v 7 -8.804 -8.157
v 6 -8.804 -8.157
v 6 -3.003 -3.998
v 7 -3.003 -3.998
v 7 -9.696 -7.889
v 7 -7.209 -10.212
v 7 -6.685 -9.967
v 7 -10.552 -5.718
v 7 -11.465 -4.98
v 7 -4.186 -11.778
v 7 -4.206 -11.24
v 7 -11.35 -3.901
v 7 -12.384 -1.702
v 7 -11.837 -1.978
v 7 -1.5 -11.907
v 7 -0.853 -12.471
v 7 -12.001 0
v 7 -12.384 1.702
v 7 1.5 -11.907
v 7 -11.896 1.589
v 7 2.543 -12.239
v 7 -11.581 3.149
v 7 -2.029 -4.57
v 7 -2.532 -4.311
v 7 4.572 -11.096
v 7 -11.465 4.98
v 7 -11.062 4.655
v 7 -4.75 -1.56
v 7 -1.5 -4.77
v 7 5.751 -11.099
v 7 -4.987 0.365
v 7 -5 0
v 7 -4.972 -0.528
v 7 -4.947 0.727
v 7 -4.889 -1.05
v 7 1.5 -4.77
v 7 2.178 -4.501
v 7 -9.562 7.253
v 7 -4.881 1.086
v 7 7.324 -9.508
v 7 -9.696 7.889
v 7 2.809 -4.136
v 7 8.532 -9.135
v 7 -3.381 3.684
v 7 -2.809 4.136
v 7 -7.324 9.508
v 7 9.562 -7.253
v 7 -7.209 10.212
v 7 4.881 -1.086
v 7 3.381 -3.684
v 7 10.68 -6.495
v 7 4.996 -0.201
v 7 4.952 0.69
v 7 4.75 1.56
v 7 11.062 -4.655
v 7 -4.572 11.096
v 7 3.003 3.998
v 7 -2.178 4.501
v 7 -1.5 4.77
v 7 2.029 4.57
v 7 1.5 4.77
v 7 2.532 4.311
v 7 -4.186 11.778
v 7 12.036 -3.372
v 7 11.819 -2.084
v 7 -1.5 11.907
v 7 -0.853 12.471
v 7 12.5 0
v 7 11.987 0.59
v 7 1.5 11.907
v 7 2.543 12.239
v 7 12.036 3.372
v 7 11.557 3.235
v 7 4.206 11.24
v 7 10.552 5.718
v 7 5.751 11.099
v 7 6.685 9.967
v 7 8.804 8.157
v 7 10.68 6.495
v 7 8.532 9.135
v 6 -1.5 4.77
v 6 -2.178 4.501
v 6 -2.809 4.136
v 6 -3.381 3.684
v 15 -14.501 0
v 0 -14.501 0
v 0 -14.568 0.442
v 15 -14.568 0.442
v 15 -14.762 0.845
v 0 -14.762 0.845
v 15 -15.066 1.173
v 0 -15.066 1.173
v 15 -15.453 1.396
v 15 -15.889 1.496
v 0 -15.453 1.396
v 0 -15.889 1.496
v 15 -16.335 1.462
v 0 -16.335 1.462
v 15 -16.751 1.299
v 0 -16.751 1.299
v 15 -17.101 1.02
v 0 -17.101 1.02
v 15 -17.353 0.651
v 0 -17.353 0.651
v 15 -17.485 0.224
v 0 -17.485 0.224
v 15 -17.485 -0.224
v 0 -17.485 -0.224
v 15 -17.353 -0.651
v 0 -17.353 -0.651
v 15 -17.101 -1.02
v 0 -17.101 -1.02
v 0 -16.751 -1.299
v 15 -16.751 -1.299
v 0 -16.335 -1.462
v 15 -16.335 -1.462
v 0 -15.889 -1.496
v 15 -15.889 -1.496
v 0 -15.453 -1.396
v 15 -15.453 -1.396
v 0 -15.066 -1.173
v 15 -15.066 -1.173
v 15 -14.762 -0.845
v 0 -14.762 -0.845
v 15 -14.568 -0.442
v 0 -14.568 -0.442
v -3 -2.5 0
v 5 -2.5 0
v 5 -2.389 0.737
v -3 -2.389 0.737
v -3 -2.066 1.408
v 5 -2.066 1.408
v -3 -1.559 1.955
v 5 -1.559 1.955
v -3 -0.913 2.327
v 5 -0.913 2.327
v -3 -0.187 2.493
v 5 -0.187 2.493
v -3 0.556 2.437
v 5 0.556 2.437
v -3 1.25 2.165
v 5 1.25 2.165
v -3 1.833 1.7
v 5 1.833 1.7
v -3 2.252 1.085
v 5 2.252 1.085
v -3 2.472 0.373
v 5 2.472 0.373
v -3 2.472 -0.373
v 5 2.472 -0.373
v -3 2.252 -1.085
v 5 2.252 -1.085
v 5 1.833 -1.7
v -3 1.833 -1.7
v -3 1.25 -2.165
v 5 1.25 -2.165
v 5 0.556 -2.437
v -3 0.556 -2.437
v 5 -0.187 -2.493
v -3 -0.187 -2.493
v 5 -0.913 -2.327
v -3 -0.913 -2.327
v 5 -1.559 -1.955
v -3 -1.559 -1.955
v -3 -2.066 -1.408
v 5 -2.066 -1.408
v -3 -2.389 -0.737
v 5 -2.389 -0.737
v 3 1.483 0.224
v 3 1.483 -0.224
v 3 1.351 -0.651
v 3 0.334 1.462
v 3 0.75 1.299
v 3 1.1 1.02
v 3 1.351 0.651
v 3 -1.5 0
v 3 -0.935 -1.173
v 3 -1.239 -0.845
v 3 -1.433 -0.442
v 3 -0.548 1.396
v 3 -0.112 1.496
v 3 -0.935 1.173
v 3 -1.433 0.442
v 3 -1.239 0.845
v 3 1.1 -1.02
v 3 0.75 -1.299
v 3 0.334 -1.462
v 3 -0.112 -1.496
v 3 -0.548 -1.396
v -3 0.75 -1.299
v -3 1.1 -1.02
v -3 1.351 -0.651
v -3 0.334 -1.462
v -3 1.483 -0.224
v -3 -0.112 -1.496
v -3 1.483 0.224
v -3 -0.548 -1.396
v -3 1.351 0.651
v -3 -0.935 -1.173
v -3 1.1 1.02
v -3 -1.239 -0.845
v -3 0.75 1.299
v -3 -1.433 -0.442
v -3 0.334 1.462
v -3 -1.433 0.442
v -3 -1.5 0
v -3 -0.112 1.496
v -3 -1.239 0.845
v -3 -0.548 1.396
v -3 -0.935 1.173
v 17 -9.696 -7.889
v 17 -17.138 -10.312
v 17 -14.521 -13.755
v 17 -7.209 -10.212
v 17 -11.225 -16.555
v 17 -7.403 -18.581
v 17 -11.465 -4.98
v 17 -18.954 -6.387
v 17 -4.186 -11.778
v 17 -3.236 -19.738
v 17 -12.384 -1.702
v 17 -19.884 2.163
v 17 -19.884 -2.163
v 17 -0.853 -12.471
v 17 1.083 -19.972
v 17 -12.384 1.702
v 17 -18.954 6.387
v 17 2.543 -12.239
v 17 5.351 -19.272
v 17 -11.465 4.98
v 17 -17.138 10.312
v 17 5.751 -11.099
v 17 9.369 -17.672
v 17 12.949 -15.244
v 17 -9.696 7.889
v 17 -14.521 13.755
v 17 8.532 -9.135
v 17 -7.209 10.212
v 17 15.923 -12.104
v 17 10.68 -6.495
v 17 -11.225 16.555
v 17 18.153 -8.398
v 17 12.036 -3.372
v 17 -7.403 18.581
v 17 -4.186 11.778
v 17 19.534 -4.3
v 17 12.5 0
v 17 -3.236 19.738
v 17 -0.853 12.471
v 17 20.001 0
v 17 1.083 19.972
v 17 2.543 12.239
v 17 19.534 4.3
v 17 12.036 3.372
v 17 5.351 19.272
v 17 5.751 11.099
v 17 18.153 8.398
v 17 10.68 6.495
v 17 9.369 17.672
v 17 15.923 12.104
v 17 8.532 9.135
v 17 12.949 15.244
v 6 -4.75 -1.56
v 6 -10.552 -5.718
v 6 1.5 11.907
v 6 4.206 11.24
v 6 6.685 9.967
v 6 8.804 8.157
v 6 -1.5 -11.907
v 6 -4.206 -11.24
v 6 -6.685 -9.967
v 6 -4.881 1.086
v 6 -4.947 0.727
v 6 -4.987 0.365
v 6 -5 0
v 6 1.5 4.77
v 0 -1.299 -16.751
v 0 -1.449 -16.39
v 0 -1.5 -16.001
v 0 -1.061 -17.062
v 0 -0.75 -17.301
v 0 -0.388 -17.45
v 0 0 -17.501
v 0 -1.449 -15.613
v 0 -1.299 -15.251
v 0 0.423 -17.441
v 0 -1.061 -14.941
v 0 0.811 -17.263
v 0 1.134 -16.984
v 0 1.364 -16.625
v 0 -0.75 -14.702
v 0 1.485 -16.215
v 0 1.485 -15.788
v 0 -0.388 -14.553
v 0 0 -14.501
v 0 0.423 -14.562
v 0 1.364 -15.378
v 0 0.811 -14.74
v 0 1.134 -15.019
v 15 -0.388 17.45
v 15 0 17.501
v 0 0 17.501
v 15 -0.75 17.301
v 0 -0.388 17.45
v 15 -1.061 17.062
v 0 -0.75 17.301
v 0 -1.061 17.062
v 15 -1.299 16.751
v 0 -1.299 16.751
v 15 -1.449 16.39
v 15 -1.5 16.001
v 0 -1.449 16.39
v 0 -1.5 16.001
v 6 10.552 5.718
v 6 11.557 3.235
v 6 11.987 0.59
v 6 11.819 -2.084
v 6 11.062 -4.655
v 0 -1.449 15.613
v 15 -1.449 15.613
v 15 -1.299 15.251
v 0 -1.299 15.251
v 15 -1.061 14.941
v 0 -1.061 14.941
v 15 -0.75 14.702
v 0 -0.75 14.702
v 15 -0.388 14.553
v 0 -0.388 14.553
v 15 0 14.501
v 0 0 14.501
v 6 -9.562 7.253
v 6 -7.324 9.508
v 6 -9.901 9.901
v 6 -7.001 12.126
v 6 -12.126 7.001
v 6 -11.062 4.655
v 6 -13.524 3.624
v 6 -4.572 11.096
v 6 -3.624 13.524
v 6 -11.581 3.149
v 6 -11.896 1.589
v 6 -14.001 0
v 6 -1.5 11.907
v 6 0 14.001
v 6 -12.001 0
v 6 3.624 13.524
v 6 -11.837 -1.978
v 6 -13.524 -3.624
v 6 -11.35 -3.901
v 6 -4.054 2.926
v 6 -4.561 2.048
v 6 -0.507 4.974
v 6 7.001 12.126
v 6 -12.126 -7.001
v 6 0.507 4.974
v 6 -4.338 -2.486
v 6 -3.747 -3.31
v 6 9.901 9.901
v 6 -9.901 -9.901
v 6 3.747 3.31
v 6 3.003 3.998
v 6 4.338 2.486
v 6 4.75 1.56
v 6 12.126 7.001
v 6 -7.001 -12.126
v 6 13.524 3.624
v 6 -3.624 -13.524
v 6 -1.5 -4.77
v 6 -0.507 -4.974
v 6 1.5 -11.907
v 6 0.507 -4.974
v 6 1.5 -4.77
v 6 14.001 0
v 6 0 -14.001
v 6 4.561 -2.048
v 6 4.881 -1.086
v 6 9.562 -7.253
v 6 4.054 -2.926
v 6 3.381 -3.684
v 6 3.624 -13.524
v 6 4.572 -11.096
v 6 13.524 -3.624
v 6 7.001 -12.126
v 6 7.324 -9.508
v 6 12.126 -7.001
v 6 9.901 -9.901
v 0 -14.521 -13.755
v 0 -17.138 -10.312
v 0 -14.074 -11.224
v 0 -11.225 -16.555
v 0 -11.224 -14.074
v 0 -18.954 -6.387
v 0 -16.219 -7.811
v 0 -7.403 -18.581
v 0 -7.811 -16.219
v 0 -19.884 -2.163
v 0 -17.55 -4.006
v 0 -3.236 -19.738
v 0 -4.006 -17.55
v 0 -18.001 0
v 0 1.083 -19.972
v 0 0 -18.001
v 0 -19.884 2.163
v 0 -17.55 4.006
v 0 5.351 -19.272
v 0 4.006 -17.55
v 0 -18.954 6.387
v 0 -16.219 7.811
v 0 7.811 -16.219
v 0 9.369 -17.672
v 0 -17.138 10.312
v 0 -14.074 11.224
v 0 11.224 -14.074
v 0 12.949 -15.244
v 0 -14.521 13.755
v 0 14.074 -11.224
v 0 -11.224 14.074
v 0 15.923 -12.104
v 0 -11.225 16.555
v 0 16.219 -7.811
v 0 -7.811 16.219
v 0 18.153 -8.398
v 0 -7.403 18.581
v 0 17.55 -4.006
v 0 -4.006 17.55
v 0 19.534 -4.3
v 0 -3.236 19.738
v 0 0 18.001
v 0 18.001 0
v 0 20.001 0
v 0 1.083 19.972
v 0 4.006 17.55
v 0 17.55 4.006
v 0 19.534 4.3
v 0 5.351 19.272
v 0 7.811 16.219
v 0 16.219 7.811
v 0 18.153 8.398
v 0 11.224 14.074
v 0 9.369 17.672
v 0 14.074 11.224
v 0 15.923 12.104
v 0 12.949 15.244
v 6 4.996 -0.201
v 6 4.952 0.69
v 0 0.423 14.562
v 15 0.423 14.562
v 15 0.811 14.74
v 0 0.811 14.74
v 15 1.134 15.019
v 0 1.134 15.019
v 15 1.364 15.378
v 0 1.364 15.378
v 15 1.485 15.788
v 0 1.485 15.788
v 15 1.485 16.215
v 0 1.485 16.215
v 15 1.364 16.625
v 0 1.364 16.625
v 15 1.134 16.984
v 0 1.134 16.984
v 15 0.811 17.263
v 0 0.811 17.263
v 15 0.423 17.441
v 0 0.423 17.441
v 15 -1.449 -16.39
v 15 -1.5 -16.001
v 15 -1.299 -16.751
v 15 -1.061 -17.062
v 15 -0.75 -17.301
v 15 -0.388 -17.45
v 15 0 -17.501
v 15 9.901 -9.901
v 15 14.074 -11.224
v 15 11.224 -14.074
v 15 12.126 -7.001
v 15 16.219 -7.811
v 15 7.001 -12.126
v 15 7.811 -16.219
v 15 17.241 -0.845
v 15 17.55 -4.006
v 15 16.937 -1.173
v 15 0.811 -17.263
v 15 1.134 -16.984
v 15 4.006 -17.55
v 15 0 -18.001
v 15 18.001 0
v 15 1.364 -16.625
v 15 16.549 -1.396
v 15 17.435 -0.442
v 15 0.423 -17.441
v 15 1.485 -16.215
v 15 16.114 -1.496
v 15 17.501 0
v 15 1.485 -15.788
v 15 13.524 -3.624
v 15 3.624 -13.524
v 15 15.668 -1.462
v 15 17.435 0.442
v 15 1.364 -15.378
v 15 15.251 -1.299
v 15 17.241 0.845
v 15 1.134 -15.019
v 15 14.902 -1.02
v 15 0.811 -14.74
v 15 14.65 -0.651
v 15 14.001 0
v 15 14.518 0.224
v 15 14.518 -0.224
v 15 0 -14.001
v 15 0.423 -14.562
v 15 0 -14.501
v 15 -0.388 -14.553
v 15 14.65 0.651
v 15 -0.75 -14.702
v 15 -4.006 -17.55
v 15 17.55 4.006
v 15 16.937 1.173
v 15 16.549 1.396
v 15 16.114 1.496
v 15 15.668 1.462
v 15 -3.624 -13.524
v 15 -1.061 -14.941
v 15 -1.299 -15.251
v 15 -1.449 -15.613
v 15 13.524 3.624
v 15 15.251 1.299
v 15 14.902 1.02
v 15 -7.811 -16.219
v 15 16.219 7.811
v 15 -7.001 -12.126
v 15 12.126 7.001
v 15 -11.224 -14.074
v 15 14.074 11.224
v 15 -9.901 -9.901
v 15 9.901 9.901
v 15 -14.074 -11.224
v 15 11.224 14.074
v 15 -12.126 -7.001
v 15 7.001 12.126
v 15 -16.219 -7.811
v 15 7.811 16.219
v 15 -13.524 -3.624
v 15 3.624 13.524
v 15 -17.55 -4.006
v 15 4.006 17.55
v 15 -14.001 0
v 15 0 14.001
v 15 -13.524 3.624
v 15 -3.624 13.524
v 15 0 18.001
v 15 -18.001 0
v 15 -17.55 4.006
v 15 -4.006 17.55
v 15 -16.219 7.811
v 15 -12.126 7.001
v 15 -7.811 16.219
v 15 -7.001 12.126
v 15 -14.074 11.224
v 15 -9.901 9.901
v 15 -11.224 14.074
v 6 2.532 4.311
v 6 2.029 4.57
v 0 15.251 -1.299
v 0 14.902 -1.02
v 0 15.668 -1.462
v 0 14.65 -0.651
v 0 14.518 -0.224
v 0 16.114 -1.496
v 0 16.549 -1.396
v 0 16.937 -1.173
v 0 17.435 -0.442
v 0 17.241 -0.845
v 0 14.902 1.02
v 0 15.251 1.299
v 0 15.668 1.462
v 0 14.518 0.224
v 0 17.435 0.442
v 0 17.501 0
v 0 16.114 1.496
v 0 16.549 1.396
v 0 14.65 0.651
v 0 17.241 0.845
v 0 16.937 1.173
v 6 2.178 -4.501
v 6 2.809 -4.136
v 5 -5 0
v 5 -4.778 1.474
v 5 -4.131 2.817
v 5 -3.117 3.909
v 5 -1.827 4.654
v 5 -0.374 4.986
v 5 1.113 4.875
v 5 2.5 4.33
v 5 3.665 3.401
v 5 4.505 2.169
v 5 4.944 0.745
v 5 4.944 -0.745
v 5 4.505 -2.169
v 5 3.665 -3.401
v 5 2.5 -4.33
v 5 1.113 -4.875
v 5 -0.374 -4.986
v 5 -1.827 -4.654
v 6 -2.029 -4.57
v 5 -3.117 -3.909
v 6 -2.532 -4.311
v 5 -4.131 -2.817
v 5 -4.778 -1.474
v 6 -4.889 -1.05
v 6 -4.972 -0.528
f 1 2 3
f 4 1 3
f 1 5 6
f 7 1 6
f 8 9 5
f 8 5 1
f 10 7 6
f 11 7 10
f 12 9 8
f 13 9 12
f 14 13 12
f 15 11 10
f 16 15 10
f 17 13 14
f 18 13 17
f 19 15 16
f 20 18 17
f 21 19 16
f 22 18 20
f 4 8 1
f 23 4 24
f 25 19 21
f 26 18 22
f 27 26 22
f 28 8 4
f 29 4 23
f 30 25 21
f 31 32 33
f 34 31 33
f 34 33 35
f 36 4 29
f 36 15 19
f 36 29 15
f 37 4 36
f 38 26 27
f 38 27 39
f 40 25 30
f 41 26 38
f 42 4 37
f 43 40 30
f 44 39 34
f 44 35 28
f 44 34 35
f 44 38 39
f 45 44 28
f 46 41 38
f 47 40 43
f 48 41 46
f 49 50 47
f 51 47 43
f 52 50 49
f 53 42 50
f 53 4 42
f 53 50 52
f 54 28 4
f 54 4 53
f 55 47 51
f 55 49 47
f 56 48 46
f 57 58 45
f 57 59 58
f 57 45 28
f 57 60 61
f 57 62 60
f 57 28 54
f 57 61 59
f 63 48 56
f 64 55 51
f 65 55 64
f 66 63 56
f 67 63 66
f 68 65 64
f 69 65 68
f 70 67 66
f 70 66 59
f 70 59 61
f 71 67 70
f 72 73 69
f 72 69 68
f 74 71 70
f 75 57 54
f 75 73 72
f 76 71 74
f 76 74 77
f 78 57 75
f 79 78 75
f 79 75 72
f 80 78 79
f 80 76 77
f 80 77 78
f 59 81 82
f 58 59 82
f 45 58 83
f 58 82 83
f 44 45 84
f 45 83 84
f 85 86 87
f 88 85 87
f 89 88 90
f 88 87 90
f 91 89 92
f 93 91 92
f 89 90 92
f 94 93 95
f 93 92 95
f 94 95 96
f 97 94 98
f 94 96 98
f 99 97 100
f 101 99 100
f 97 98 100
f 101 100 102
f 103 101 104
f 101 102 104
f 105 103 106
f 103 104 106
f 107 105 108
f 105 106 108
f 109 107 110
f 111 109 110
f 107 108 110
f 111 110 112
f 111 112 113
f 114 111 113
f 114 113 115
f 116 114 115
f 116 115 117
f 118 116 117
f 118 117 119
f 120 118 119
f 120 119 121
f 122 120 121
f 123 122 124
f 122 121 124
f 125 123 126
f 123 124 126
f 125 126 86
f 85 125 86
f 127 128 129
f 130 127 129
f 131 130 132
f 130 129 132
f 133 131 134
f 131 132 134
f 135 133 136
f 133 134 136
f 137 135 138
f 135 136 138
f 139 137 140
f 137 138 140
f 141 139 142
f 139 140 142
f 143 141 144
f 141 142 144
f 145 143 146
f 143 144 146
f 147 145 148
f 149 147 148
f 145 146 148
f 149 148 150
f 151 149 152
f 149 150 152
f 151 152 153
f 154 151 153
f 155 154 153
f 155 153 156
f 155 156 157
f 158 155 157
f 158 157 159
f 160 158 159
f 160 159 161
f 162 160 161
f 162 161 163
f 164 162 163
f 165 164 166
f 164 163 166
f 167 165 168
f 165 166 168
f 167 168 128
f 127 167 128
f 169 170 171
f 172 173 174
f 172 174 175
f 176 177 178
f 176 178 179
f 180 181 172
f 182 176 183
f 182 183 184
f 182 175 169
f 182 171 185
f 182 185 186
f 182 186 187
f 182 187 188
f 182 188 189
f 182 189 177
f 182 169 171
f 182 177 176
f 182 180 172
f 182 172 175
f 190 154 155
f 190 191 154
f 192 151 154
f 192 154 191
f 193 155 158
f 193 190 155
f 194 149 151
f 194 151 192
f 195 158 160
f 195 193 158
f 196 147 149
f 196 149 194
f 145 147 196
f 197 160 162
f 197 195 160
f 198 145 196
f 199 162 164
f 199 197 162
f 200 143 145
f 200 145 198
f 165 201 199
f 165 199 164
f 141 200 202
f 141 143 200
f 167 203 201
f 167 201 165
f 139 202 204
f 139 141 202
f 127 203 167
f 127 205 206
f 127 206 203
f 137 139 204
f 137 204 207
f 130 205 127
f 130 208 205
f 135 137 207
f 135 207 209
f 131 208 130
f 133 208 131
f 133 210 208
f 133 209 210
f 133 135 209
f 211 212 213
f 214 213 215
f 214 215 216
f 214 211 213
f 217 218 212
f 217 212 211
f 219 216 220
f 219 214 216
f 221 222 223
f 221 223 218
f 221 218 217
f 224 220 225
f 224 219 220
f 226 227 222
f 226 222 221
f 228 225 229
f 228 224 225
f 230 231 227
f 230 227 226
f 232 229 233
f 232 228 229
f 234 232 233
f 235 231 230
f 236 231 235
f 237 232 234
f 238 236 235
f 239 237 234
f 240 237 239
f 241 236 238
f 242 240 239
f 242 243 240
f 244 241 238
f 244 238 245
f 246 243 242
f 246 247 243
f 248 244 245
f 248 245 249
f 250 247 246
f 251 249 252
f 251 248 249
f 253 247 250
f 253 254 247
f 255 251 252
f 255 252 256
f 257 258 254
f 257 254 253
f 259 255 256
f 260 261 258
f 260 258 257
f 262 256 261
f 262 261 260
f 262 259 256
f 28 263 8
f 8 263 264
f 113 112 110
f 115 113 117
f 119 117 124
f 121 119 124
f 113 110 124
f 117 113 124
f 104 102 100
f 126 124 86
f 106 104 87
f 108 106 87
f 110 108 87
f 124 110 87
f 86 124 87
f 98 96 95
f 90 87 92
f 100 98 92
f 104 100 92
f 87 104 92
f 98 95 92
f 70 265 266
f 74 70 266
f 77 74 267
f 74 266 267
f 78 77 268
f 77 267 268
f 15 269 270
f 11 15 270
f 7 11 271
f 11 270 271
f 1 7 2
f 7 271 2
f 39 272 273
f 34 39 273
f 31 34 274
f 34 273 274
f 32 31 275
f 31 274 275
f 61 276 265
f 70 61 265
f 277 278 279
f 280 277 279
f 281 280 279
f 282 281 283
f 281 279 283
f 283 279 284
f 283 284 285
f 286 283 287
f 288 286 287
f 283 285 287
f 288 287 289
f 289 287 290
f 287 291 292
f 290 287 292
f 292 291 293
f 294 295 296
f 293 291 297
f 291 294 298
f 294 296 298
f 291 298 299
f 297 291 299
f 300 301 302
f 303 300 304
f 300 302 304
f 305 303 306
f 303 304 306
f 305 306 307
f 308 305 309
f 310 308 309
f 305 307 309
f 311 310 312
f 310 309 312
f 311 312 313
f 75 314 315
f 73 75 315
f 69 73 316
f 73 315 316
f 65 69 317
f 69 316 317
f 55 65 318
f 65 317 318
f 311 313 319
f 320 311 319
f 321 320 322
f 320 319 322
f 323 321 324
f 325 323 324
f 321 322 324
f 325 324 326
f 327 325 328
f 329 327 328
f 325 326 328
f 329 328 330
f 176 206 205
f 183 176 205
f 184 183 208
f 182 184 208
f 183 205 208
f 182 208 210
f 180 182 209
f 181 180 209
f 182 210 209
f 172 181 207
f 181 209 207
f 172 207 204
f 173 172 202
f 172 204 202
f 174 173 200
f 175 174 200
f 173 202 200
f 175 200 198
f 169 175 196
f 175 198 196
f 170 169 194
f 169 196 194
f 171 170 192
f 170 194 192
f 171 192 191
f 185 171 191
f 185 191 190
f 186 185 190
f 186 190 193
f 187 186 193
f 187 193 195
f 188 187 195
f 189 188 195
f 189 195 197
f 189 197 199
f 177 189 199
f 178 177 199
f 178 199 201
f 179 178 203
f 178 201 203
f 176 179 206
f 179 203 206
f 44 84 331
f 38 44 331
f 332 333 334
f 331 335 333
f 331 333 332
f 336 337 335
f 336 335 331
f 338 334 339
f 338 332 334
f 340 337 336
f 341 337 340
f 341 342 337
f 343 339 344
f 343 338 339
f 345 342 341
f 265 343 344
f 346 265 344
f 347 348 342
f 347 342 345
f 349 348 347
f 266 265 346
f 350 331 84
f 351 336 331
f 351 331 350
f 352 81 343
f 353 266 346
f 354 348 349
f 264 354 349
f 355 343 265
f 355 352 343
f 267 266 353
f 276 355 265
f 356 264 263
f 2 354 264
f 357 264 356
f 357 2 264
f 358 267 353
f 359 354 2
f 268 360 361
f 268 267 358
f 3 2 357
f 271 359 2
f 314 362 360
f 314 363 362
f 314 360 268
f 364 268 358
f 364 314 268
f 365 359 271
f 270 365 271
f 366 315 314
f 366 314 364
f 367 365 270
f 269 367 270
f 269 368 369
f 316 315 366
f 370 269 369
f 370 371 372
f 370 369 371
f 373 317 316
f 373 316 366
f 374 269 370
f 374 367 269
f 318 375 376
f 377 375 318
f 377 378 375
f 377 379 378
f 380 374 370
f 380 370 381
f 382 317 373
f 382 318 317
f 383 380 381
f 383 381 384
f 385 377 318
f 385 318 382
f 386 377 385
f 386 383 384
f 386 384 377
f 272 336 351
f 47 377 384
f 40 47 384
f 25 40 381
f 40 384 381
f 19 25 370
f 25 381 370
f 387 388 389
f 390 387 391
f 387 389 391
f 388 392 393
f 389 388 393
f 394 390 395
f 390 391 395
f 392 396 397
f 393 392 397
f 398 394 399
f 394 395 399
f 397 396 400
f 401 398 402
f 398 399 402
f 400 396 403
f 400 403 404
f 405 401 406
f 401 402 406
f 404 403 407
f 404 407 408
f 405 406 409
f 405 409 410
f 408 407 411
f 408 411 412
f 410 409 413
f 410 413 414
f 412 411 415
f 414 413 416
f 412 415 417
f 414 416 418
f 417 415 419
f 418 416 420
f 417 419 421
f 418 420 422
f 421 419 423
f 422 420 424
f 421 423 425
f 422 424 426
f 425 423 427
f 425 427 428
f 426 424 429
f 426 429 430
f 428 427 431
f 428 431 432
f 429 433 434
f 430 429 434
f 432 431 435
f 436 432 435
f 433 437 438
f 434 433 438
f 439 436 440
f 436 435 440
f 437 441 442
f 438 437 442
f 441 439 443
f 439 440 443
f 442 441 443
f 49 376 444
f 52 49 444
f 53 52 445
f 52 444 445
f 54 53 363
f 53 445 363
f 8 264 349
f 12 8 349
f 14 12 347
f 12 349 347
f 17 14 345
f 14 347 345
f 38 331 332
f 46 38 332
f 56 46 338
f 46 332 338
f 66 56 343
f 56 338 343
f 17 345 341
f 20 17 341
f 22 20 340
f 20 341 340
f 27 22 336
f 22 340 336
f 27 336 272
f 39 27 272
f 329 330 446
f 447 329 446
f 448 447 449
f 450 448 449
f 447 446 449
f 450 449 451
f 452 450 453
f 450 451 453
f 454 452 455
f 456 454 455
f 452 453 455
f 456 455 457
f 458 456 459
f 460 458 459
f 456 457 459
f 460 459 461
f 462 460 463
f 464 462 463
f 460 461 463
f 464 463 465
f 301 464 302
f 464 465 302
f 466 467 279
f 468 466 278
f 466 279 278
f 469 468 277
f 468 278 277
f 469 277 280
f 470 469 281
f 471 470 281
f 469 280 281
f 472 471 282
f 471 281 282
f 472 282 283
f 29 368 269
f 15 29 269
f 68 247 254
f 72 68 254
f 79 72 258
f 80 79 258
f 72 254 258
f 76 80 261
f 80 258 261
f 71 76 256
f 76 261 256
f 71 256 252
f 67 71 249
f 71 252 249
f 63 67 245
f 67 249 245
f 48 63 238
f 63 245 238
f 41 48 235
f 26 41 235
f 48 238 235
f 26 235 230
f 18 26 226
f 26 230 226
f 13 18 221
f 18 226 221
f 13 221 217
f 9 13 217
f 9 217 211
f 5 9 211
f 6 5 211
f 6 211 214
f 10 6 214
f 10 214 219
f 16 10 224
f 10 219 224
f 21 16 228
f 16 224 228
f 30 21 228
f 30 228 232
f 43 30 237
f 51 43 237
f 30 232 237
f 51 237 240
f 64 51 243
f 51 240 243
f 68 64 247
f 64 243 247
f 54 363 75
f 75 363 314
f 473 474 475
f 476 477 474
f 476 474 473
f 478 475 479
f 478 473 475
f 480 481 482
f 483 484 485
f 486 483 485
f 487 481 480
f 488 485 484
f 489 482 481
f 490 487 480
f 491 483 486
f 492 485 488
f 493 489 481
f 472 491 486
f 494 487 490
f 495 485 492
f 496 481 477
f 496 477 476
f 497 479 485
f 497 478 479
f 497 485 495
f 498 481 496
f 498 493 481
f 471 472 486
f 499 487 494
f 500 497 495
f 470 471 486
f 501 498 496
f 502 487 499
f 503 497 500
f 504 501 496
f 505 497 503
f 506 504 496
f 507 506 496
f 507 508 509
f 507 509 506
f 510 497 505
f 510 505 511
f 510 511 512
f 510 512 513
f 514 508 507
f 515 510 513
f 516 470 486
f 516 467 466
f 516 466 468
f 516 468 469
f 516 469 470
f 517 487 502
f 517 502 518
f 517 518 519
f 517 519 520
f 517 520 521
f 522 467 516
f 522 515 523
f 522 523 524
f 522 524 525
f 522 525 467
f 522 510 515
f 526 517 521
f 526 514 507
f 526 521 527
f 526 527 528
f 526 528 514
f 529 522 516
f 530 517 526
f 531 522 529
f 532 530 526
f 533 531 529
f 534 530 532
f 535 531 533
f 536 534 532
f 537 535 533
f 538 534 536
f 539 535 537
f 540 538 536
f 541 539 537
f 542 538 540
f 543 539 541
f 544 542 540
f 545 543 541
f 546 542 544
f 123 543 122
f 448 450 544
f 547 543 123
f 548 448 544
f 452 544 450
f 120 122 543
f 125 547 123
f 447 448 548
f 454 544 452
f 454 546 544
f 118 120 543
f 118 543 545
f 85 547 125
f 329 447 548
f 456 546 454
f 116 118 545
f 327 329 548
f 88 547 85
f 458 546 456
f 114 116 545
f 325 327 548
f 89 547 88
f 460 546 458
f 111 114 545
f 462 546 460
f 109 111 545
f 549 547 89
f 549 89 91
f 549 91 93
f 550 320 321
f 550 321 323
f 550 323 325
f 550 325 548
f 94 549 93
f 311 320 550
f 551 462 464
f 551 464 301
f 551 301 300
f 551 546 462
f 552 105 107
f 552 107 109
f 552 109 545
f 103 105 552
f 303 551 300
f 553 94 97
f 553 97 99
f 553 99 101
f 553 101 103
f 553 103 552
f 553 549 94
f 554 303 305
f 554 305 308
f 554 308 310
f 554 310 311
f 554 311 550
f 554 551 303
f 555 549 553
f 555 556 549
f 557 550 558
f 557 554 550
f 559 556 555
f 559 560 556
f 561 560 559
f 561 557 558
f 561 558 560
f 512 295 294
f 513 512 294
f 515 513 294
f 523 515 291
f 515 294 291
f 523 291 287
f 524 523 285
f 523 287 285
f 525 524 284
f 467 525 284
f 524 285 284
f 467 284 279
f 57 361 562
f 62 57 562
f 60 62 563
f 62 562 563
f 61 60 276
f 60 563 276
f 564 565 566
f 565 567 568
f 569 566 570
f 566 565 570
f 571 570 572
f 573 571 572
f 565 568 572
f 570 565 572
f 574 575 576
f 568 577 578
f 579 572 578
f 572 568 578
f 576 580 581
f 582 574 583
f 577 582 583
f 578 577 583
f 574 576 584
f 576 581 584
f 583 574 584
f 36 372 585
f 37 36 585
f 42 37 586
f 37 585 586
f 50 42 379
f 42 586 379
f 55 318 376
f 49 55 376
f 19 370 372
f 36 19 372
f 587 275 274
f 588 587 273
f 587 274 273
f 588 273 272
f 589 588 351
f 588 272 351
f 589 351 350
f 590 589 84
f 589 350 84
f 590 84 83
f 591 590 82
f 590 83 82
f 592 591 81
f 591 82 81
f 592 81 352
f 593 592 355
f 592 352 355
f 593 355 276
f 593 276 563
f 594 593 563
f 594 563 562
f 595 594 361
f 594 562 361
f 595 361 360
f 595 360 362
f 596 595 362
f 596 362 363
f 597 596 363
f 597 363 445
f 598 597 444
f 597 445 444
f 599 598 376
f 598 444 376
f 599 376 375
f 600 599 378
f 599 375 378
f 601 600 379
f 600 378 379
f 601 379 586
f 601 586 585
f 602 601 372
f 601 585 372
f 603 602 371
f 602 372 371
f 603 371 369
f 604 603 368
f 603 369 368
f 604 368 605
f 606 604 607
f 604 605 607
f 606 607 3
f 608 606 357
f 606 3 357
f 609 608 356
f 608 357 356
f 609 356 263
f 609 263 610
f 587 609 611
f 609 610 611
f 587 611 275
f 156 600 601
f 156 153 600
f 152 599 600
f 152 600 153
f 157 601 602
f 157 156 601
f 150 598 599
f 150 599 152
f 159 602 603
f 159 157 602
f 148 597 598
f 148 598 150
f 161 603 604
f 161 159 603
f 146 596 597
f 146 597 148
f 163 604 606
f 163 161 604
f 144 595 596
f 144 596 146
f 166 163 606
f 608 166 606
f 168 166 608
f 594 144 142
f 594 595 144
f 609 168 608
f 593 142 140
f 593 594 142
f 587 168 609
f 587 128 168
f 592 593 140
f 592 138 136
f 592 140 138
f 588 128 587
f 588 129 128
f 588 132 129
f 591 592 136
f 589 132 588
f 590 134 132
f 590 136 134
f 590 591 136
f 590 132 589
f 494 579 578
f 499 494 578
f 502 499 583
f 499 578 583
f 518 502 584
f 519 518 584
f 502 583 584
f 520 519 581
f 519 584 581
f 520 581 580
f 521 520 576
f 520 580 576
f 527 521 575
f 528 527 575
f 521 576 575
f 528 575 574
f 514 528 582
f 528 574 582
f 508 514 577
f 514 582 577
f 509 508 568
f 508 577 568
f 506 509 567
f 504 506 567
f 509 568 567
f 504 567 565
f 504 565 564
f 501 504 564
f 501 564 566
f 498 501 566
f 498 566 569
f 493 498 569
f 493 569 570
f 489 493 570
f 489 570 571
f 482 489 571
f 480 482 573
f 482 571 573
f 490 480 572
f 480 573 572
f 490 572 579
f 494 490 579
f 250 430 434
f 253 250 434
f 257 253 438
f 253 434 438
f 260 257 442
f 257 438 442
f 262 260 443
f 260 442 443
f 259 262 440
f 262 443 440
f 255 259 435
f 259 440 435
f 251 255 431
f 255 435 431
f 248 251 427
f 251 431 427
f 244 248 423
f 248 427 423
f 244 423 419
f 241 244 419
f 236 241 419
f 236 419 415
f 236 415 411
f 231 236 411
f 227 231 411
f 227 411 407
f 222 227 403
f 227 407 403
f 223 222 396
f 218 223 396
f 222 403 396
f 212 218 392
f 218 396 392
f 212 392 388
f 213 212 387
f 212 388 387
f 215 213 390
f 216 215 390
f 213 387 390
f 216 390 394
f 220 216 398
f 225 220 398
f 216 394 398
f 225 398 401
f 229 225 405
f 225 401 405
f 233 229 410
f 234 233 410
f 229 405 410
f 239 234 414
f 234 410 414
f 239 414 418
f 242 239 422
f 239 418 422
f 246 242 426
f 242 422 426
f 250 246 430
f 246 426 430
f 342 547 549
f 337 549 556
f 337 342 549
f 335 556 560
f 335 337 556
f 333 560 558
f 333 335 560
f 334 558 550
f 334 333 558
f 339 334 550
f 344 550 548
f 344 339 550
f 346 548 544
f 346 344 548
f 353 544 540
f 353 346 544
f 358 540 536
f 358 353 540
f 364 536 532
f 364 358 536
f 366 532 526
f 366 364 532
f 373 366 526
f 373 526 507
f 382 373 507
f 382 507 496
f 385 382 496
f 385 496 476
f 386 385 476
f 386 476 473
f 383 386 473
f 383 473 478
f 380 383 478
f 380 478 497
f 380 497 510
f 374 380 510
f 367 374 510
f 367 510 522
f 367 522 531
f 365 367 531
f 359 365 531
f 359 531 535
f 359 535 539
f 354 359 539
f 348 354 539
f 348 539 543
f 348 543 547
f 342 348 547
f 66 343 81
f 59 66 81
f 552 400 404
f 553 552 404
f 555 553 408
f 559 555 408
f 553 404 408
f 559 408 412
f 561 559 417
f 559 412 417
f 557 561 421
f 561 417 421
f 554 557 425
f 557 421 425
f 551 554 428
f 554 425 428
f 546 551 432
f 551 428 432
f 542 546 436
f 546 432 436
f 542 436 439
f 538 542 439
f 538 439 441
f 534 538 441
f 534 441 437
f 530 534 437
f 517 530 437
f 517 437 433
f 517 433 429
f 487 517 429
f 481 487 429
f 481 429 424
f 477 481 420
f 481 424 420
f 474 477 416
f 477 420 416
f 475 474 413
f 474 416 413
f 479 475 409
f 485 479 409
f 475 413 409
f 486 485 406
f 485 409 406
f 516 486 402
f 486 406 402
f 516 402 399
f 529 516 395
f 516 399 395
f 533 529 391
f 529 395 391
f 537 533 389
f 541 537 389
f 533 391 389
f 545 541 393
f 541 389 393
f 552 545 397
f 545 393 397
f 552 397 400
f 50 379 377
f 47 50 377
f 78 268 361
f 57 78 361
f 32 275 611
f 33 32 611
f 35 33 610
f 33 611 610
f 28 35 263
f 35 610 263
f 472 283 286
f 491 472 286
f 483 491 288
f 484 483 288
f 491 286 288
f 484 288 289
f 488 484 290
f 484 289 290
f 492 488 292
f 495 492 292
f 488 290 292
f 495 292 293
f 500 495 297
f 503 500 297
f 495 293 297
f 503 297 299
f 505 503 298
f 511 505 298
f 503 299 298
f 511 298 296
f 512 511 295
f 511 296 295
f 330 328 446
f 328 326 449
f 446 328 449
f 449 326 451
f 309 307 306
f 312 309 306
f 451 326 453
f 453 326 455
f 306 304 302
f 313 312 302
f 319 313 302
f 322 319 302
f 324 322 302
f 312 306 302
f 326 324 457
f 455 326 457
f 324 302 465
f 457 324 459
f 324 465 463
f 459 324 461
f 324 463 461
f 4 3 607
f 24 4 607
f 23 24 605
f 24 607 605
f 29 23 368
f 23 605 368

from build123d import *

# Parameters (mm, degrees)
F0_R      = 20.001471
F1_DEPTH  = 17
F2_R      = 18.001471
F2_R_2    = 14.001471
F3_DEPTH  = 15
F3_FACE_R = 14.001471
F4_DEPTH  = 6
F6_DEPTH  = 25
F7_R      = 12.5
F8_DEPTH  = 10
F9_R      = 5
F10_DEPTH = 1
F11_R     = 2.5
F12_DEPTH = 8
F13_R     = 1.5
F14_DEPTH = 6


with BuildPart() as f1:
    # F0 (on Right) → F1 (new body)
    with BuildSketch(Plane.YZ):
        Circle(F0_R)
    extrude(amount=F1_DEPTH)

    # F2 (on face) → F3 (cut)
    with BuildSketch(Plane(origin=(0, 0, 0), x_dir=(0, -1, 0), z_dir=(-1, 0, 0))):
        Circle(F2_R)
        with BuildLine():
            ThreePointArc((0, -17.501471), (-1.5, -16.001471), (0, -14.501471))
            ThreePointArc((0, -14.501471), (1.06066, -14.940811), (1.5, -16.001471))
            ThreePointArc((1.5, -16.001471), (1.06066, -17.062132), (0, -17.501471))
        make_face(mode=Mode.SUBTRACT)
        with BuildLine():
            ThreePointArc((-14.501471, 0), (-16.001471, -1.5), (-17.501471, 0))
            ThreePointArc((-17.501471, 0), (-16.001471, 1.5), (-14.501471, 0))
        make_face(mode=Mode.SUBTRACT)
        Circle(F2_R_2, mode=Mode.SUBTRACT)
        with BuildLine():
            ThreePointArc((17.501471, 0), (16.001471, -1.5), (14.501471, 0))
            ThreePointArc((14.501471, 0), (16.001471, 1.5), (17.501471, 0))
        make_face(mode=Mode.SUBTRACT)
        with BuildLine():
            ThreePointArc((0, 14.501471), (-1.5, 16.001471), (0, 17.501471))
            ThreePointArc((0, 17.501471), (1.06066, 17.062132), (1.5, 16.001471))
            ThreePointArc((1.5, 16.001471), (1.06066, 14.940811), (0, 14.501471))
        make_face(mode=Mode.SUBTRACT)
    extrude(amount=-F3_DEPTH, mode=Mode.SUBTRACT)

    # F3_face (on face) → F4 (cut)
    with BuildSketch(Plane(origin=(0, 0, 0), x_dir=(0, 1, 0), z_dir=(-1, 0, 0))):
        Circle(F3_FACE_R)
    extrude(amount=-F4_DEPTH, mode=Mode.SUBTRACT)

    # F5 (on face) → F6 (cut)
    with BuildSketch(Plane(origin=(6, 0, 0), x_dir=(0, -1, 0), z_dir=(-1, 0, 0))):
        with BuildLine():
            Line((-11.06208, -4.654644), (-4.880678, -1.08581))
            ThreePointArc((-4.880678, -1.08581), (-4.993956, 0.245766), (-4.750481, 1.559784))
            Line((-4.750481, 1.559784), (-10.551599, 5.71831))
            ThreePointArc((-10.551599, 5.71831), (-11.986965, 0.58991), (-11.06208, -4.654644))
        make_face()
        with BuildLine():
            ThreePointArc((-3.002631, 3.998025), (-2.284139, 4.447776), (-1.5, 4.769696))
            Line((-1.5, 4.769696), (-1.5, 11.907364))
            ThreePointArc((-1.5, 11.907364), (-5.482605, 10.675971), (-8.803749, 8.156551))
            Line((-8.803749, 8.156551), (-3.002631, 3.998025))
        make_face()
        with BuildLine():
            ThreePointArc((1.5, 4.769696), (2.5, 4.330127), (3.380678, 3.683886))
            Line((3.380678, 3.683886), (9.56208, 7.25272))
            ThreePointArc((9.56208, 7.25272), (6.000736, 10.393579), (1.5, 11.907364))
            Line((1.5, 11.907364), (1.5, 4.769696))
        make_face()
        with BuildLine():
            ThreePointArc((4.880678, 1.08581), (4.97008, 0.546173), (5, 0))
            ThreePointArc((5, 0), (4.937226, -0.789808), (4.750481, -1.559784))
            Line((4.750481, -1.559784), (10.551599, -5.71831))
            ThreePointArc((10.551599, -5.71831), (11.633358, -2.949627), (12.001471, 0))
            ThreePointArc((12.001471, 0), (11.76428, 2.374245), (11.06208, 4.654644))
            Line((11.06208, 4.654644), (4.880678, 1.08581))
        make_face()
        with BuildLine():
            Line((8.803749, -8.156551), (3.002631, -3.998025))
            ThreePointArc((3.002631, -3.998025), (2.284139, -4.447776), (1.5, -4.769696))
            Line((1.5, -4.769696), (1.5, -11.907364))
            ThreePointArc((1.5, -11.907364), (5.482605, -10.675971), (8.803749, -8.156551))
        make_face()
        with BuildLine():
            Line((-1.5, -11.907364), (-1.5, -4.769696))
            ThreePointArc((-1.5, -4.769696), (-2.5, -4.330127), (-3.380678, -3.683886))
            Line((-3.380678, -3.683886), (-9.56208, -7.25272))
            ThreePointArc((-9.56208, -7.25272), (-6.000736, -10.393579), (-1.5, -11.907364))
        make_face()
    extrude(amount=-F6_DEPTH, mode=Mode.SUBTRACT)

    # F7 (on face) → F8 (cut)
    with BuildSketch(Plane.YZ.offset(17)):
        Circle(F7_R)
    extrude(amount=-F8_DEPTH, mode=Mode.SUBTRACT)

    # F9 (on face) → F10 (join)
    with BuildSketch(Plane(origin=(6, 0, 0), x_dir=(0, -1, 0), z_dir=(-1, 0, 0))):
        Circle(F9_R)
    extrude(amount=F10_DEPTH)

    # F11 (on face) → F12 (join)
    with BuildSketch(Plane(origin=(5, 0, 0), x_dir=(0, -1, 0), z_dir=(-1, 0, 0))):
        Circle(F11_R)
    extrude(amount=F12_DEPTH)

    # F13 (on face) → F14 (cut)
    with BuildSketch(Plane(origin=(-3, 0, 0), x_dir=(0, -1, 0), z_dir=(-1, 0, 0))):
        Circle(F13_R)
    extrude(amount=-F14_DEPTH, mode=Mode.SUBTRACT)


solid = f1.part
